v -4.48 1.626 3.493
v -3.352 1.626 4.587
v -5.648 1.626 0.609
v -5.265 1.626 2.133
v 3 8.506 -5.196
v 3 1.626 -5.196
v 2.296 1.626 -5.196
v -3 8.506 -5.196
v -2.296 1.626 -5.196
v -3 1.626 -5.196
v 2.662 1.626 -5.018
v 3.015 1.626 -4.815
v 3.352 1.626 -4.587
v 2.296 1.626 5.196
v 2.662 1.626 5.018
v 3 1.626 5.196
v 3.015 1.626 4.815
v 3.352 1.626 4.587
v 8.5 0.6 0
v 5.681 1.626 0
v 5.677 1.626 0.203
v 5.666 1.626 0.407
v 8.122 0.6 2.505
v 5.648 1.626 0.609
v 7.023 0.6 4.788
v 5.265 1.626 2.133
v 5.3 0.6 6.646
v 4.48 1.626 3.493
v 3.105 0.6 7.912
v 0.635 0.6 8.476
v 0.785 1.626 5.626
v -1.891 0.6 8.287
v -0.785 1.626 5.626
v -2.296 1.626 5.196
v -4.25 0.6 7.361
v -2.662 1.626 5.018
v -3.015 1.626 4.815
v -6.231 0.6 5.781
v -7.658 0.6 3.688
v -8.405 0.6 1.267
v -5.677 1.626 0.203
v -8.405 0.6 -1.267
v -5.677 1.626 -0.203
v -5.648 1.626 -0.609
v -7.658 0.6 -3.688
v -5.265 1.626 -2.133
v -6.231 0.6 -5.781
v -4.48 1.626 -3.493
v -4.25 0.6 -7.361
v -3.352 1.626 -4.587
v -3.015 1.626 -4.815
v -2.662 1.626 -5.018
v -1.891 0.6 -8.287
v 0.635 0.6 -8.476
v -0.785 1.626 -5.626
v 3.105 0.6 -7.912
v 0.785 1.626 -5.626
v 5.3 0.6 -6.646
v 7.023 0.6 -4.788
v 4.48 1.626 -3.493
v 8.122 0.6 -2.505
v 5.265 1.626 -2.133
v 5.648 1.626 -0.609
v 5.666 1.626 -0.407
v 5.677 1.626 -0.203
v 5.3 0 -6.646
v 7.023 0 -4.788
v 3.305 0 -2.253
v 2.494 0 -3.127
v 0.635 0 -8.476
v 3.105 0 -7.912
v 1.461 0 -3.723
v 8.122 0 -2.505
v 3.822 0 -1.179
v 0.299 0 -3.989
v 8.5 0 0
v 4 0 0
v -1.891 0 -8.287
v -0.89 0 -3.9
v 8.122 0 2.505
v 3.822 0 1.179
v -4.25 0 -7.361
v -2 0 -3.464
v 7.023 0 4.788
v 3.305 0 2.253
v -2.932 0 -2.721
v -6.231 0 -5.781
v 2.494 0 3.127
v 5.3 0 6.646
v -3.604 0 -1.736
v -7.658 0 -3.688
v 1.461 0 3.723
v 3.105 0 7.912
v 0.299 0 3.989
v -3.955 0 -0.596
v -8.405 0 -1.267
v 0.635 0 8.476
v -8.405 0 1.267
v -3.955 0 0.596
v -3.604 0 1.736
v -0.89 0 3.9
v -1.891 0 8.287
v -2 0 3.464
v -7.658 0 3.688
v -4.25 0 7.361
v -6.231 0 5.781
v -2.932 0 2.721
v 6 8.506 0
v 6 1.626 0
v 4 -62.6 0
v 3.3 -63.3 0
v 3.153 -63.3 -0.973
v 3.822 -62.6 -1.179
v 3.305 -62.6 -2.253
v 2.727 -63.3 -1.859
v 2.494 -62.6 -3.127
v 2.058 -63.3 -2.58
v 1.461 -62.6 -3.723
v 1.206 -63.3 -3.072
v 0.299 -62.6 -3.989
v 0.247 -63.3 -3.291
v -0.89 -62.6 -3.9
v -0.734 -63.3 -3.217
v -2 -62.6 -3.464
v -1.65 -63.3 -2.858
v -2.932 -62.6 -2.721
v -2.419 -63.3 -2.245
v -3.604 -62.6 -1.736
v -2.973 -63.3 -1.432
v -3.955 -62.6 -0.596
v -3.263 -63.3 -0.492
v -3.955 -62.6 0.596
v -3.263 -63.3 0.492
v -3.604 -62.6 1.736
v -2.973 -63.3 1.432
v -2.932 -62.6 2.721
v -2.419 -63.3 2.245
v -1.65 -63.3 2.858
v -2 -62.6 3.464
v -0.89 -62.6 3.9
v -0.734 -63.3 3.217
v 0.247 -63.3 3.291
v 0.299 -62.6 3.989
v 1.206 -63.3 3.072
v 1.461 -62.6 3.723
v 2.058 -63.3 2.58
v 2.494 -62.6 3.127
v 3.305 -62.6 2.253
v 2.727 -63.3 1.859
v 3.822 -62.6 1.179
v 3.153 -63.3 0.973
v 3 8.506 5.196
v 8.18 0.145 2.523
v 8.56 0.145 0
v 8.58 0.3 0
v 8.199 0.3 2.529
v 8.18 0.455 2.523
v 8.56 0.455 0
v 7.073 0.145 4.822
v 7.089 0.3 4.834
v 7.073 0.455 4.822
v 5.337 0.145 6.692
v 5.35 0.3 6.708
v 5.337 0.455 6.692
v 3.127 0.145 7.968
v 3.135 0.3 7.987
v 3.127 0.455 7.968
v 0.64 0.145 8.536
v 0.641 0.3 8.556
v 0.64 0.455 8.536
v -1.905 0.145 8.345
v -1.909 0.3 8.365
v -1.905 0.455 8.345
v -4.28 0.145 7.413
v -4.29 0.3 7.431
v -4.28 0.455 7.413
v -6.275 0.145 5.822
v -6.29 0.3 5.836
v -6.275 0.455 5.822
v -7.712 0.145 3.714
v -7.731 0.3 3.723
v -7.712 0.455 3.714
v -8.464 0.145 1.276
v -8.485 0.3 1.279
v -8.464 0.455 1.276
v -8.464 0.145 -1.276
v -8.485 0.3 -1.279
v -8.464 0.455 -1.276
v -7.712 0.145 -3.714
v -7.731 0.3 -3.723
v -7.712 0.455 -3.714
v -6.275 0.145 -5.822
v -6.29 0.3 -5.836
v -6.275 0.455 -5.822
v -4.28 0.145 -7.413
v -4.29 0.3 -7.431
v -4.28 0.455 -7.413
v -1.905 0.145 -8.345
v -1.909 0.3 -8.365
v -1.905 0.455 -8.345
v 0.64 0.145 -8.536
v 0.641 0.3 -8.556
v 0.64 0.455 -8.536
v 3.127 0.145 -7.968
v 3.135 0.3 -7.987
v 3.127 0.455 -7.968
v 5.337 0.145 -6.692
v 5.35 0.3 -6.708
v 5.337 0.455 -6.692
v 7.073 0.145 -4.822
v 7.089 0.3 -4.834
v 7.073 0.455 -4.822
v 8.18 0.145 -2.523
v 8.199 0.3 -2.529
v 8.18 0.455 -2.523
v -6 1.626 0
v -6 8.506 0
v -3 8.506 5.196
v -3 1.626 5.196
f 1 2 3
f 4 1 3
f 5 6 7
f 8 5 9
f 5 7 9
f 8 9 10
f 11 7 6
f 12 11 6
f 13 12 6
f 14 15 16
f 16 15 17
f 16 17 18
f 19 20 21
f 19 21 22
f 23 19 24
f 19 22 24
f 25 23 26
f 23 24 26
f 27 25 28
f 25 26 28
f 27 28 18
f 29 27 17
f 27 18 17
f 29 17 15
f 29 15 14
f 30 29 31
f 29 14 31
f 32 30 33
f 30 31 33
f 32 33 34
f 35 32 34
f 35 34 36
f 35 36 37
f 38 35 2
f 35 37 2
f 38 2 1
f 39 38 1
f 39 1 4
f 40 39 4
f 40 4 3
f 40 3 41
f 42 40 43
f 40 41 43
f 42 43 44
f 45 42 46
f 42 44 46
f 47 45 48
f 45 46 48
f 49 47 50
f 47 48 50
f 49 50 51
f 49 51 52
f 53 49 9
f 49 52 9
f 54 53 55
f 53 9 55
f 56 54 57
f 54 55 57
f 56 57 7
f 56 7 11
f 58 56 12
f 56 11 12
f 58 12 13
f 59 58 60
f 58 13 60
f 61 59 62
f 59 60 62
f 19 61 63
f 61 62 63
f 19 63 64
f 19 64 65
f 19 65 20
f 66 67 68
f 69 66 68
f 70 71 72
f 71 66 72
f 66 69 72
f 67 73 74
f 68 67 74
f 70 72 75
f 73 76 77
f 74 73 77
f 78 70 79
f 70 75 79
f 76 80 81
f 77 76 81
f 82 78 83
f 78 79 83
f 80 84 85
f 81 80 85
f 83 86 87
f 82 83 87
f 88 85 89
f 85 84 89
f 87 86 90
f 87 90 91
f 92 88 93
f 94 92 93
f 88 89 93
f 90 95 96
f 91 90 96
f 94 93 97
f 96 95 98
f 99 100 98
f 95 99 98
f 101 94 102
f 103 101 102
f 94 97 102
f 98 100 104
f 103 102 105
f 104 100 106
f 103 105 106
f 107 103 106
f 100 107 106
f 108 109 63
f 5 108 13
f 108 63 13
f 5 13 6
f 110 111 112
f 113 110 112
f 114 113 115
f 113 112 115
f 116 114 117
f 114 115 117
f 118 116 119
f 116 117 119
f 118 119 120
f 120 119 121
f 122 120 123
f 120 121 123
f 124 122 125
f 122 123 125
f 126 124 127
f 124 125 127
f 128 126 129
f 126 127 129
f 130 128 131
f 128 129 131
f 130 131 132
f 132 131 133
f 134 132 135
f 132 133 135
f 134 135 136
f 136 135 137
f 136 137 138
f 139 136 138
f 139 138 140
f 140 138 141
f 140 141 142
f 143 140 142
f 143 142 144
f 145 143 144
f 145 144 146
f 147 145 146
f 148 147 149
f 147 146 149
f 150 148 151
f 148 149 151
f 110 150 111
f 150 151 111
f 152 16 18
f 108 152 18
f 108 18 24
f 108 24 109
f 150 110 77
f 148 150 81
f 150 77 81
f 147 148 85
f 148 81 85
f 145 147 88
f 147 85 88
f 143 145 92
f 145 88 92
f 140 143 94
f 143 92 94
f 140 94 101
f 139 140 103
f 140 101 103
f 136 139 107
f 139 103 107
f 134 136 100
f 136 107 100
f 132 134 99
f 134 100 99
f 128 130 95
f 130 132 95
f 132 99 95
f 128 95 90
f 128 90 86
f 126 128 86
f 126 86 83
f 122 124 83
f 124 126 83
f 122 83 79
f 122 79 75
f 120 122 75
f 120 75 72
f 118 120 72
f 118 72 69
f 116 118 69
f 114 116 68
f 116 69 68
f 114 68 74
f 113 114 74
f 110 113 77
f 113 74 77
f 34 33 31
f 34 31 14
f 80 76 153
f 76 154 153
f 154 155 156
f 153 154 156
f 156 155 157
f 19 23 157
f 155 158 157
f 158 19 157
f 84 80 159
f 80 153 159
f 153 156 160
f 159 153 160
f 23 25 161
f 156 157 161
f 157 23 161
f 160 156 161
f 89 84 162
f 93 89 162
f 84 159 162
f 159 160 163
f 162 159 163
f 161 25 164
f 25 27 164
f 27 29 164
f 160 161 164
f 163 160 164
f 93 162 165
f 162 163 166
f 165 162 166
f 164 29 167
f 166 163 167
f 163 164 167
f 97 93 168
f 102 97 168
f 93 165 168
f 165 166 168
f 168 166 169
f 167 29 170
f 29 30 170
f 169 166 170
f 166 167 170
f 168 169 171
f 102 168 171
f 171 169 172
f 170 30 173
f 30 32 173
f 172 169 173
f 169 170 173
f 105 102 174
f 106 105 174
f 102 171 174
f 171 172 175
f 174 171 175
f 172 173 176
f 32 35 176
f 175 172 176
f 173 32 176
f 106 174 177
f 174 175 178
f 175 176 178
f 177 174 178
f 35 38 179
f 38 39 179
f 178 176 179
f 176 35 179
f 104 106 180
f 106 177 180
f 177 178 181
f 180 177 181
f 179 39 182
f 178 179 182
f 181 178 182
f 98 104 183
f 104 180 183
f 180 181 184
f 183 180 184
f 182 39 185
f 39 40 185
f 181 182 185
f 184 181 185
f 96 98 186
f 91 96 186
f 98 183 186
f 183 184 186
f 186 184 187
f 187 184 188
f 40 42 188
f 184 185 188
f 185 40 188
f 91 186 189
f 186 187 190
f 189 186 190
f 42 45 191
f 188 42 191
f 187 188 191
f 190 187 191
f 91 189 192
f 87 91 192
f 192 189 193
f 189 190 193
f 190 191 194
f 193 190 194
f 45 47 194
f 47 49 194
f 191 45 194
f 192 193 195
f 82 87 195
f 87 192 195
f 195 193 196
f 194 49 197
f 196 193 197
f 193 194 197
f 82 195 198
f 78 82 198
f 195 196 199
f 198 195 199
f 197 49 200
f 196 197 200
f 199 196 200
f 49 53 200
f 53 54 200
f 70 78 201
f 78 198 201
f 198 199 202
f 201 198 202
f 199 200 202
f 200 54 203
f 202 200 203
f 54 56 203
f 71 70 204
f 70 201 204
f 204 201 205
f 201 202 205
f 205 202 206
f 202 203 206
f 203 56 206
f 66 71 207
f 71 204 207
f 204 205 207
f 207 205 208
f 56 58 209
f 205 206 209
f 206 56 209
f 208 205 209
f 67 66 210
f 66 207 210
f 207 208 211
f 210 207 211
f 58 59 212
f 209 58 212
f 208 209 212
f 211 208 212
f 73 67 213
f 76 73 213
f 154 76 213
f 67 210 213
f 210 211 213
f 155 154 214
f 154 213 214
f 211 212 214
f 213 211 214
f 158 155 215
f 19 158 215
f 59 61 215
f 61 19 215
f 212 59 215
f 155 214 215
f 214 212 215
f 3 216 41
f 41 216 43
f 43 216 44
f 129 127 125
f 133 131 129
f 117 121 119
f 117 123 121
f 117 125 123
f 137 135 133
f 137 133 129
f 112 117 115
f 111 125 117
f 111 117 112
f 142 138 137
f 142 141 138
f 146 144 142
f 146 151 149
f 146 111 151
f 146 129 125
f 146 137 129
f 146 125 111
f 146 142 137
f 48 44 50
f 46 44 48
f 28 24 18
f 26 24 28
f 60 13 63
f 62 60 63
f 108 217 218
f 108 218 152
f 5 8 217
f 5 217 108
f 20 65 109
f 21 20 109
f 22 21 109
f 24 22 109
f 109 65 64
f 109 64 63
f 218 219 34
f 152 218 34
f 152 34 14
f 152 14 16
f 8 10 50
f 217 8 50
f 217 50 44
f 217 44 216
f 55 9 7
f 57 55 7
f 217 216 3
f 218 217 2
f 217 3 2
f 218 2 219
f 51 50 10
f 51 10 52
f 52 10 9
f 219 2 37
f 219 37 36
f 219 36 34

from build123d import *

# Parameters (mm, degrees)
BOSS_EXTRUDE1_DEPTH = 6.88
SKETCH3_R           = 4
BOSS_EXTRUDE2_DEPTH = 64
SKETCH4_R           = 4
CUT_EXTRUDE1_DEPTH  = 0.7
CUT_EXTRUDE1_TAPER  = -45
CHAMFER1_SIZE       = 0.7


with BuildPart() as part:
    # Sketch1 → Revolve1 (revolve)
    with BuildSketch(Plane.XY):
        with BuildLine():
            Line((0, 0), (8.5, 0))
            ThreePointArc((8.5, 0), (8.580384758, 0.3), (8.5, 0.6))
            Line((8.5, 0.6), (5.680922138, 1.62606043))
            Line((5.680922138, 1.62606043), (0, 1.62606043))
            Line((0, 1.62606043), (0, 0))
        make_face()
    revolve(axis=Axis((0, 1.62606043, 0), (0, -1, 0)))

    # Sketch2 → Boss-Extrude1 (add)
    with BuildSketch(Plane(origin=(0, 1.62606043, 0), x_dir=(1, 0, 0), z_dir=(0, 1, 0))):
        Polygon((6, 0), (3, 5.196152423), (-3, 5.196152423), (-6, 0), (-3, -5.196152423), (3, -5.196152423), align=None)
    extrude(amount=BOSS_EXTRUDE1_DEPTH)

    # Sketch3 → Boss-Extrude2 (add)
    with BuildSketch(Plane.XZ):
        Circle(SKETCH3_R)
    extrude(amount=BOSS_EXTRUDE2_DEPTH)

    # Sketch4 → Cut-Extrude1 (cut)
    with BuildSketch(Plane.XZ.offset(64)):
        Circle(SKETCH4_R)
    extrude(amount=-CUT_EXTRUDE1_DEPTH, taper=CUT_EXTRUDE1_TAPER, mode=Mode.SUBTRACT)

    # Chamfer1
    chamfer1_edges = [part.edges().sort_by_distance(p)[0] for p in [
        (-4, -63.3, 0),
    ]]
    chamfer(chamfer1_edges, length=CHAMFER1_SIZE)


solid = part.part
